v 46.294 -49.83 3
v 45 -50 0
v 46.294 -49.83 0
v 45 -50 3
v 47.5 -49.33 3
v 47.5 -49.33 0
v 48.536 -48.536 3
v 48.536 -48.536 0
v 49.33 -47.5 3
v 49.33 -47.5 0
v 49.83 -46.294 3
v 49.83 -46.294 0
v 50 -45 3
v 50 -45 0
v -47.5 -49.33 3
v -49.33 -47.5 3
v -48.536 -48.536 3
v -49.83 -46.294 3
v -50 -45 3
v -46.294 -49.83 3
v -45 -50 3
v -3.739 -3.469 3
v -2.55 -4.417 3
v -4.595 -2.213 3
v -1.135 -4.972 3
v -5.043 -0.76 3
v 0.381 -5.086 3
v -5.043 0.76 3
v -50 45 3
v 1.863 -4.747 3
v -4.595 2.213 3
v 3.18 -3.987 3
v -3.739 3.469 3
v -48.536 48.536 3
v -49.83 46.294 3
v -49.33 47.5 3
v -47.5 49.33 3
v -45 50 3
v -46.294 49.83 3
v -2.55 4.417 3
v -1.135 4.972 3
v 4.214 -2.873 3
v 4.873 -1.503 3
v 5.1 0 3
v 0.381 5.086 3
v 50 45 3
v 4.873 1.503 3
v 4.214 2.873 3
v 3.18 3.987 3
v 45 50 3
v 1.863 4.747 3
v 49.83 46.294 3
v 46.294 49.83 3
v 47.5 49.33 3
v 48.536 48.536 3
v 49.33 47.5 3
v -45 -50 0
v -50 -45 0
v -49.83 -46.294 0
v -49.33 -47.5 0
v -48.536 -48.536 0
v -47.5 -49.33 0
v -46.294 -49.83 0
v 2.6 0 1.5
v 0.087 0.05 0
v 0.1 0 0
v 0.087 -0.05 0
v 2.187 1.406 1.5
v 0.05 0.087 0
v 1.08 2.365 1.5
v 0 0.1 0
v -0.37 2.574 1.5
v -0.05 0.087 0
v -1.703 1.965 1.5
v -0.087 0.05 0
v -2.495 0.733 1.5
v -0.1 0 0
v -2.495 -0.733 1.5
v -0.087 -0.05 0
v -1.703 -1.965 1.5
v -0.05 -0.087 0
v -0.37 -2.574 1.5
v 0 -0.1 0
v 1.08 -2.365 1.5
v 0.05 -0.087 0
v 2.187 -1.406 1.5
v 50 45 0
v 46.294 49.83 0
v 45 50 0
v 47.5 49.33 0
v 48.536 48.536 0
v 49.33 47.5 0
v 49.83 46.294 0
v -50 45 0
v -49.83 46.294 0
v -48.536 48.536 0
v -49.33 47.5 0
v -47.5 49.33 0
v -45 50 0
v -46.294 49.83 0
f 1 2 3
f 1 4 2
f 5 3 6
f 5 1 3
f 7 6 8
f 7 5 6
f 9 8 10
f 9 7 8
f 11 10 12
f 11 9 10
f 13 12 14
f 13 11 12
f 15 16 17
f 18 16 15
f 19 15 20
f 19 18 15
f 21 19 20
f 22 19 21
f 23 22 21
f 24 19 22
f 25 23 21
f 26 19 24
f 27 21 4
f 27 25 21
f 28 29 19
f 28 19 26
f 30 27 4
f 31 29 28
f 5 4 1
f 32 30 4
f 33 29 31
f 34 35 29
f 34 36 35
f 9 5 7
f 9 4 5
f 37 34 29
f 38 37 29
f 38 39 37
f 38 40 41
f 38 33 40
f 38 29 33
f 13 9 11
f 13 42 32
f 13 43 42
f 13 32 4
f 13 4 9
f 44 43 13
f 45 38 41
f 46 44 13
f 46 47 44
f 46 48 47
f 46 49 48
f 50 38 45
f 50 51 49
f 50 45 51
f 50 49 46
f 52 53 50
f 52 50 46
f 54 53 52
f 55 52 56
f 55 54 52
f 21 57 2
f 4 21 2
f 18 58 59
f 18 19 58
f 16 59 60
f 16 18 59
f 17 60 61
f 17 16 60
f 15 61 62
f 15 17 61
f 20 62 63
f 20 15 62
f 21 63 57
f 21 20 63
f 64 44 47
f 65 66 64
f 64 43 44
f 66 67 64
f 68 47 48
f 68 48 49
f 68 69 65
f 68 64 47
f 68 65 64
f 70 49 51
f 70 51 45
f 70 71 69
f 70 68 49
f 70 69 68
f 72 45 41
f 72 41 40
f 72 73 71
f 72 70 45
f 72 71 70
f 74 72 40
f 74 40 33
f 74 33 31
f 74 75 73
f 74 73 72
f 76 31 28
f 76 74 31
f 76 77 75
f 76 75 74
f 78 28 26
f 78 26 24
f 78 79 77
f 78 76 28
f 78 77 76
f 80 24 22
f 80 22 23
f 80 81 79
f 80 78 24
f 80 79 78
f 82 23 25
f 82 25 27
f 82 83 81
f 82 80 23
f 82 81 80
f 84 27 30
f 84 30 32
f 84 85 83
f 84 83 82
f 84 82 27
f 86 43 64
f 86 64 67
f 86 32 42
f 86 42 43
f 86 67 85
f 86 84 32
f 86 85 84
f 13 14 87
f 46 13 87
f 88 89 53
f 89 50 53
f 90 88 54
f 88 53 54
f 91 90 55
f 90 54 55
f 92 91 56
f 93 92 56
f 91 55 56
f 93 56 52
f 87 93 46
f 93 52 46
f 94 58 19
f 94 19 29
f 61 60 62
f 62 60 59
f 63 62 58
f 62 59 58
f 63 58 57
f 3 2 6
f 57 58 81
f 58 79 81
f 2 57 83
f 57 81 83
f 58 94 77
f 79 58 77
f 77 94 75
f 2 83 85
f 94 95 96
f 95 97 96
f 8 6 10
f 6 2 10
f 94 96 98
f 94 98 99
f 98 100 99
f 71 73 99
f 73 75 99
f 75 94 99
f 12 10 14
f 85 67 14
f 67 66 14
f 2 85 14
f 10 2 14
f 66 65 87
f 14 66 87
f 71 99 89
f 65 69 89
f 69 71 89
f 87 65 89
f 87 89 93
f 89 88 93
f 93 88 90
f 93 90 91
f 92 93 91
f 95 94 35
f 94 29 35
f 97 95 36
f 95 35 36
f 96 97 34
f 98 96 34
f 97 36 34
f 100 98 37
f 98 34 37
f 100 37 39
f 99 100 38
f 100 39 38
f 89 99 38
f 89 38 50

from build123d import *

# Parameters (mm, degrees)
F0_W     = 100
F0_H     = 100
F0_R     = 0.1
F1_DEPTH = 3
F2_SIZE2 = 2.99999
F2_SIZE  = 4.99999
F3_R     = 5


# Not quite as in the source:
# - a fillet or chamfer is up to 0.001 mm smaller than in the source, because OpenCascade refuses the exact size


with BuildPart() as f1:
    # F0 (on Top) → F1 (new body)
    with BuildSketch(Plane.XY):
        Rectangle(F0_W, F0_H)
        Circle(F0_R, mode=Mode.SUBTRACT)
    extrude(amount=F1_DEPTH)

    # F2 (size 5 and 3 in the source; OpenCascade refuses exactly that, so slightly less here)
    f2_edges = [f1.edges().sort_by_distance(p)[0] for p in [
        (-0.1, 0, 3),
    ]]
    f2_side = f1.faces().sort_by_distance((0, -48.585786, 3))[0]
    chamfer(f2_edges, length=F2_SIZE, length2=F2_SIZE2, reference=f2_side)

    # F3
    f3_edges = [f1.edges().sort_by_distance(p)[0] for p in [
        (50, -50, 1.5),
        (-50, -50, 1.5),
        (50, 50, 1.5),
        (-50, 50, 1.5),
    ]]
    fillet(f3_edges, radius=F3_R)


solid = f1.part
